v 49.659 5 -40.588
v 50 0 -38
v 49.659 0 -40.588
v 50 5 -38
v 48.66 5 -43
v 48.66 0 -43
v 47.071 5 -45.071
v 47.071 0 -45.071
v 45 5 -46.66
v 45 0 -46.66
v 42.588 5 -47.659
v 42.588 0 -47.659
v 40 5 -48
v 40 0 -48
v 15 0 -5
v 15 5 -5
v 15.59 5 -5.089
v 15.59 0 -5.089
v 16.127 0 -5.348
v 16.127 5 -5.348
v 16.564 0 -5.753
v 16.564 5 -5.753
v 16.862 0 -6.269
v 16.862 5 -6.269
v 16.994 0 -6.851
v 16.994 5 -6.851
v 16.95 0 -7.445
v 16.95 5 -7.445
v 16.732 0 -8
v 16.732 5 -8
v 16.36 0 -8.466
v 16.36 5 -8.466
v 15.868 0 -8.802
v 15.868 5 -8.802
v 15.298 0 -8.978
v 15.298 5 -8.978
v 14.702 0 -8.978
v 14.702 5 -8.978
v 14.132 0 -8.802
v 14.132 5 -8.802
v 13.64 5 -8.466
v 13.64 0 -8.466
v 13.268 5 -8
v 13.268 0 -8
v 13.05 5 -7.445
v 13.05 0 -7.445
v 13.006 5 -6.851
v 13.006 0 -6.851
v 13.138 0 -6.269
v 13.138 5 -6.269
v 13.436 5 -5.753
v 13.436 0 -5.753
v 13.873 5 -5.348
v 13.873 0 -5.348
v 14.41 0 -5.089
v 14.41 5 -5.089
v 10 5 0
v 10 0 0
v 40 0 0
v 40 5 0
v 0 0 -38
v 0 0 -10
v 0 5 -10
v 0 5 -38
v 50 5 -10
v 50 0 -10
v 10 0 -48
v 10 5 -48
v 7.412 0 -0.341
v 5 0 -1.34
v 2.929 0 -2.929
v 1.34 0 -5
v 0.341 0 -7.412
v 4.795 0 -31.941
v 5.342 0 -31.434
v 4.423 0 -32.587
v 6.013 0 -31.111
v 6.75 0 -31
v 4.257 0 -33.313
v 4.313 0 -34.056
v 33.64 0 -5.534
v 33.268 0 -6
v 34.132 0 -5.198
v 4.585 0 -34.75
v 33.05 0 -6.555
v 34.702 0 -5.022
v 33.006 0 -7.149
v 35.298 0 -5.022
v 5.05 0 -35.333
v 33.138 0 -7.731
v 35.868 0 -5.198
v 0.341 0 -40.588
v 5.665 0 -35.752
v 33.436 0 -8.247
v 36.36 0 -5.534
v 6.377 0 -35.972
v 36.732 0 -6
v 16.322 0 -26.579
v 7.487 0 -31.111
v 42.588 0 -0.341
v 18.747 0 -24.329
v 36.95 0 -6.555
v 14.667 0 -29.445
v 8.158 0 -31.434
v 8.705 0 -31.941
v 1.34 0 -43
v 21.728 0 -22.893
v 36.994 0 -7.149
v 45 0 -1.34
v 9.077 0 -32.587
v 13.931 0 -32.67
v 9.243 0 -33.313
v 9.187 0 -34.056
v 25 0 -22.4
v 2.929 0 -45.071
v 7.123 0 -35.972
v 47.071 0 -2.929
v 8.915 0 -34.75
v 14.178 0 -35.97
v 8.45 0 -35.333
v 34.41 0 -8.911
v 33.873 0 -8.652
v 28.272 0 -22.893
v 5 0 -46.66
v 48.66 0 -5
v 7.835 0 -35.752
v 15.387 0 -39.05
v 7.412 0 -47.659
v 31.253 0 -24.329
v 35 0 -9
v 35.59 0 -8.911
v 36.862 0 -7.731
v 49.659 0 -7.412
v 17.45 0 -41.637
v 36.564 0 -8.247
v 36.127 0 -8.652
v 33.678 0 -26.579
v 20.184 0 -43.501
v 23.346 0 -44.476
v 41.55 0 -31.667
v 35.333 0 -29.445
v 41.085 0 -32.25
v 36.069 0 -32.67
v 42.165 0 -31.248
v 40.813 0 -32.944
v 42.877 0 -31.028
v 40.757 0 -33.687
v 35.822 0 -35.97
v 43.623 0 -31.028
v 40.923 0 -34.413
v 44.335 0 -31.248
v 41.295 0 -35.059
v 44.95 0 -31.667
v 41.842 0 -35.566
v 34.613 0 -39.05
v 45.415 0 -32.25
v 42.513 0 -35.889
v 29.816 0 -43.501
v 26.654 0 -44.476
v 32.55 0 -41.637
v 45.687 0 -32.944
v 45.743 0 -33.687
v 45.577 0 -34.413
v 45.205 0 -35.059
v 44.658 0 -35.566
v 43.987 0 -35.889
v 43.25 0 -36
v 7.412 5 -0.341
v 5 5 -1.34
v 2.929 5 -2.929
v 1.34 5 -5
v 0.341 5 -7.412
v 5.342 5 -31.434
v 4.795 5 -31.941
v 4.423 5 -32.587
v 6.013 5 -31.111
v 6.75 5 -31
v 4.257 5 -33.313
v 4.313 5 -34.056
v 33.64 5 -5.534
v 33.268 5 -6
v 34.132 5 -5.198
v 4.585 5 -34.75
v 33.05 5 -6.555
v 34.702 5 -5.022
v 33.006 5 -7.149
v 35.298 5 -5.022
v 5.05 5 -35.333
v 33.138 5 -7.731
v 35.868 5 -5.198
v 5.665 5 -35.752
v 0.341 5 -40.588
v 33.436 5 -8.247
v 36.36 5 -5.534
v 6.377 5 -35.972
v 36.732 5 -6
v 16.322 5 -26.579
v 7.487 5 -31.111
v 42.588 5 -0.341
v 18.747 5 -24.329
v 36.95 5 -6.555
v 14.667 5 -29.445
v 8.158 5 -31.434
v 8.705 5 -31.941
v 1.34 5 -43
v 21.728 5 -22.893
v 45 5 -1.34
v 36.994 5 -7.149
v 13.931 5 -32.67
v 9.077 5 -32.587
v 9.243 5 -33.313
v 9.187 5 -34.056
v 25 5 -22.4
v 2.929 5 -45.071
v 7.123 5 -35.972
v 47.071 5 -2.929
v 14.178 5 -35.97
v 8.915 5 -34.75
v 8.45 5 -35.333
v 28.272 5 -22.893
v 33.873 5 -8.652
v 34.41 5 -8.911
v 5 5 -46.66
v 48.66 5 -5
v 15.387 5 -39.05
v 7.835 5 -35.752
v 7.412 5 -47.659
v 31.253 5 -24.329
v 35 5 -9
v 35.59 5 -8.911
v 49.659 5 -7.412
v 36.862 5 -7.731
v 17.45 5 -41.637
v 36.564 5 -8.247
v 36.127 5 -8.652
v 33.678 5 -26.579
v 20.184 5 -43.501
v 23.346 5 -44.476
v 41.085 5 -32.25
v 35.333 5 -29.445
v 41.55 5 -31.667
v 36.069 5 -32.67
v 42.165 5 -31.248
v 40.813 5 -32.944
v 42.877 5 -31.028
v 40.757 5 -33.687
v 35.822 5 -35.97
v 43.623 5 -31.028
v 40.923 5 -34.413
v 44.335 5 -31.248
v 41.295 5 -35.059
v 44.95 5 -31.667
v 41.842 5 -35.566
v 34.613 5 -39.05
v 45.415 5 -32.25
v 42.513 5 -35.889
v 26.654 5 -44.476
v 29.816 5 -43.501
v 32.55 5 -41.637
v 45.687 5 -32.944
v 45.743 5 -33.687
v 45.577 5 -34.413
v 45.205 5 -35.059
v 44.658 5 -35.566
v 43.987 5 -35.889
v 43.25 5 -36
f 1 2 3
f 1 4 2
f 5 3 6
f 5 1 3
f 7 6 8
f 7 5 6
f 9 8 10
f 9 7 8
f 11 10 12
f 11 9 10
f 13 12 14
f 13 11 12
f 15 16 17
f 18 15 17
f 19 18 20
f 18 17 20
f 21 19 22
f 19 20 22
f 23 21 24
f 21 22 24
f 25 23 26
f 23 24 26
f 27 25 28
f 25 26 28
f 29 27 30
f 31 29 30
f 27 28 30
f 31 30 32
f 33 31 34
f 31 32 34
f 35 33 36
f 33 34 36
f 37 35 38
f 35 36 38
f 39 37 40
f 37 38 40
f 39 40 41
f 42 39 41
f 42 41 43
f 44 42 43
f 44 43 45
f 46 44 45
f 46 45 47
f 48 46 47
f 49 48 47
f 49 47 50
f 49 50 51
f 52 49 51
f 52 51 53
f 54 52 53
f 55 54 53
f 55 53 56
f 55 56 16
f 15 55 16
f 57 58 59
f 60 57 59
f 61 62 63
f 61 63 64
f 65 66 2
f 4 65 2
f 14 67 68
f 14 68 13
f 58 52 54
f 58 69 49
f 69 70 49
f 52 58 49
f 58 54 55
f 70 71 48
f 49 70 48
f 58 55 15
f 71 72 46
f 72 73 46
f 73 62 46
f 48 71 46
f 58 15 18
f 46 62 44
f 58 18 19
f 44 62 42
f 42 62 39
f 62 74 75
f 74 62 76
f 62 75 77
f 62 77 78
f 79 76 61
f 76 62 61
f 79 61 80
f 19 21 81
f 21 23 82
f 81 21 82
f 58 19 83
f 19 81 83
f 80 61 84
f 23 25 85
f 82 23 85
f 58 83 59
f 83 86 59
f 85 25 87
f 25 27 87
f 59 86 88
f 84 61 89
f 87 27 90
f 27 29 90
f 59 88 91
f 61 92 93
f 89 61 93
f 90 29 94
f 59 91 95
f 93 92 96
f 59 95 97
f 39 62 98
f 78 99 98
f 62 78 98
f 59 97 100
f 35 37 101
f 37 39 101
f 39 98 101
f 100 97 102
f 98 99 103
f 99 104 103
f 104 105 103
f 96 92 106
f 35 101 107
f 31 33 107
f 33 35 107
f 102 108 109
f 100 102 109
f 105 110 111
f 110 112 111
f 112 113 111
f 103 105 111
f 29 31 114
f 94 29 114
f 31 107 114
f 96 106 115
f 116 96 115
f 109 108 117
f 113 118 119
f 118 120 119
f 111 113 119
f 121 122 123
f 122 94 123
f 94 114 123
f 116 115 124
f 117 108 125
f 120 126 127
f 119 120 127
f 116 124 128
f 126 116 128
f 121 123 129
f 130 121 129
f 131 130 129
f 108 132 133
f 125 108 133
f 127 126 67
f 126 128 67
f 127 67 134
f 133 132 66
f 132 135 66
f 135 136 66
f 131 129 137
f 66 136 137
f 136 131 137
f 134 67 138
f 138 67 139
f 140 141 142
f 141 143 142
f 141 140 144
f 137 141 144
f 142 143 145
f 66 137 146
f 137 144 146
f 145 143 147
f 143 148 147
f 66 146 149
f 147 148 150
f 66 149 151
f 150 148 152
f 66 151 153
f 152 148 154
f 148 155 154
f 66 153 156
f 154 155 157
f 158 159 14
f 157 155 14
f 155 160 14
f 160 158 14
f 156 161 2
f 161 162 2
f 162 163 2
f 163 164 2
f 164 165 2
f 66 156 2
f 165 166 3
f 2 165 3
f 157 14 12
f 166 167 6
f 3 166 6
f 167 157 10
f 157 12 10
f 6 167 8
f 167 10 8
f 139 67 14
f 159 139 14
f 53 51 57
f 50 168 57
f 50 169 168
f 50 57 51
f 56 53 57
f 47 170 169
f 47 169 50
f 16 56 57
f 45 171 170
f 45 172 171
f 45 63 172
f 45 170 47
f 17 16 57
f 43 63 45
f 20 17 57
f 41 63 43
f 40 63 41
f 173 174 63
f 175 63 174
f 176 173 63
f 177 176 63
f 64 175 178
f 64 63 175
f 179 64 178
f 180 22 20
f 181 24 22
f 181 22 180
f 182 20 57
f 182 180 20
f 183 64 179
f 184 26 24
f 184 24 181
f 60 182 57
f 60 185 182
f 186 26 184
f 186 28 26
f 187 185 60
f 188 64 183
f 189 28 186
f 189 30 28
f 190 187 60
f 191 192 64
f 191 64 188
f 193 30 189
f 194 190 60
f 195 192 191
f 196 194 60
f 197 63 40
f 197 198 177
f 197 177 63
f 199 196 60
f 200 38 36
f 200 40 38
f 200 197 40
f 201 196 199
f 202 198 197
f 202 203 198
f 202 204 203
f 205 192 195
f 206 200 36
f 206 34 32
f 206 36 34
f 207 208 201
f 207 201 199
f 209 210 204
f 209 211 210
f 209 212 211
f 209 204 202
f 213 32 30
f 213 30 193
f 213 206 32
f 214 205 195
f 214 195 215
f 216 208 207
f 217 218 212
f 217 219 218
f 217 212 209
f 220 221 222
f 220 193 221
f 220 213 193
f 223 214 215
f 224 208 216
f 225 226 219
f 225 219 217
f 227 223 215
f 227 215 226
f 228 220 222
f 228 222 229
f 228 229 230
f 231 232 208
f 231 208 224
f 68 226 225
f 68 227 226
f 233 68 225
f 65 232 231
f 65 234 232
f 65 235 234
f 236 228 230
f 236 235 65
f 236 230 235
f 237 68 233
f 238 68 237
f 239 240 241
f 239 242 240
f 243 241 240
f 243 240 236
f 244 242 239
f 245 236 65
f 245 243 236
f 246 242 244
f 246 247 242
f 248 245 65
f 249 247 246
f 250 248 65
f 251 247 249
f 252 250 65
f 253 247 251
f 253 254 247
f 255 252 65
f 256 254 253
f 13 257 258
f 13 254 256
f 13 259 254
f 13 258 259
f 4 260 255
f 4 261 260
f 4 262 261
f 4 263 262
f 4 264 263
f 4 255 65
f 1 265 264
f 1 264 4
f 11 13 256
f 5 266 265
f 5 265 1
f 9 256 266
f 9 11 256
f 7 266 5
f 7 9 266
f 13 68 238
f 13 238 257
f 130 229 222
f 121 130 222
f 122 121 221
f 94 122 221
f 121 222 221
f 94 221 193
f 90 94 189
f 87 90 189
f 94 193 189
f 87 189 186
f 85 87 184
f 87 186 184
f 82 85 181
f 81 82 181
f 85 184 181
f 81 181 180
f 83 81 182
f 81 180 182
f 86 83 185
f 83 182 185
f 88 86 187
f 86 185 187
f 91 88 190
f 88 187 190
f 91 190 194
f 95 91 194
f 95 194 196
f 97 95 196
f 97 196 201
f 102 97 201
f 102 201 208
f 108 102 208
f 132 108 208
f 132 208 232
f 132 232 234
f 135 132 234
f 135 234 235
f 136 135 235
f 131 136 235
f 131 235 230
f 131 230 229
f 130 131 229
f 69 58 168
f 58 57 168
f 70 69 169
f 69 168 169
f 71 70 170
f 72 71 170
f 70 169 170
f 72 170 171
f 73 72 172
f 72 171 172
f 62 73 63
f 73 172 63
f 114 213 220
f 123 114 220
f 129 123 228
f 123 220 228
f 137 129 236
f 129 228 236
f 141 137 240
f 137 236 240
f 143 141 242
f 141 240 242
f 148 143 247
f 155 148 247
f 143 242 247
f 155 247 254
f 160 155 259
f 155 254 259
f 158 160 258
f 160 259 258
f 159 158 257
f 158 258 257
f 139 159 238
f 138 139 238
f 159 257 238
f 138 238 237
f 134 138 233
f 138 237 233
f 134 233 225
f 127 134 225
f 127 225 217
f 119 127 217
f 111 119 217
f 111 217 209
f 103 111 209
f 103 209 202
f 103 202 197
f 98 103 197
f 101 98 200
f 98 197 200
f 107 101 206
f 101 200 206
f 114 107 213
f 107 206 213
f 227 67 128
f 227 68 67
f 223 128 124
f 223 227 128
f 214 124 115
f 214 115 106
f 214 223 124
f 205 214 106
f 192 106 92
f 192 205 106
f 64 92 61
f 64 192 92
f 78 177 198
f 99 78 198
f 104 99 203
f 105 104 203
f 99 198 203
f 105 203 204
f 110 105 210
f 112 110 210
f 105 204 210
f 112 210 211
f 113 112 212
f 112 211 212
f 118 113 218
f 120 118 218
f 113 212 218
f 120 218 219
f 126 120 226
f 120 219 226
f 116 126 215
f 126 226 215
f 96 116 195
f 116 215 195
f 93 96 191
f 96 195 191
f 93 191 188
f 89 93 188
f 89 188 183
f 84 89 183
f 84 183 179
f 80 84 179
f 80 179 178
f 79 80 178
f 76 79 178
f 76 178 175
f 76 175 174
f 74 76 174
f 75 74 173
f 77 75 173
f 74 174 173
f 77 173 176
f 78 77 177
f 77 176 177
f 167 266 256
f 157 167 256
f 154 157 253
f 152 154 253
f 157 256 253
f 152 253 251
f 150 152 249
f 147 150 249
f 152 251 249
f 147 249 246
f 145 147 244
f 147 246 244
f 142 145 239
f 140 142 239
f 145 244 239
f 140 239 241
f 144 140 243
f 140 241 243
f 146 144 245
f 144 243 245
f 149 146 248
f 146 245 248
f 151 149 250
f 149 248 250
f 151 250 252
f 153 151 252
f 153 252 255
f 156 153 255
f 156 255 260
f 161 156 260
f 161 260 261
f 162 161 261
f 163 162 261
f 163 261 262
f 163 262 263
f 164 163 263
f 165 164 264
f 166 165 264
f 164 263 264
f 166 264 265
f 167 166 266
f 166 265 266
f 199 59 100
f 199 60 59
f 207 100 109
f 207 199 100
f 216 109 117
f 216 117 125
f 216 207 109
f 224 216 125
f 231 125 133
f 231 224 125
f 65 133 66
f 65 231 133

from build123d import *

# Parameters (mm, degrees)
ESBO_O1_W                = 50
ESBO_O1_H                = 48
RESSALTO_EXTRUS_O1_DEPTH = 5
ESBO_O2_R                = 11.1
ESBO_O2_R_2              = 2.5
CORTE_EXTRUS_O1_DEPTH    = 5
FILETE1_R                = 10
FILETE2_R                = 10
FILETE3_R                = 10
FILETE4_R                = 10
ESBO_O3_R                = 2
CORTE_EXTRUS_O2_DEPTH    = 22


with BuildPart() as part:
    # Esboço1 → Ressalto-extrusão1 (new body)
    with BuildSketch(Plane(origin=(0, 0, 0), x_dir=(1, 0, 0), z_dir=(0, 1, 0))):
        with Locations((25, 24)):
            Rectangle(ESBO_O1_W, ESBO_O1_H)
    extrude(amount=RESSALTO_EXTRUS_O1_DEPTH)

    # Esboço2 → Corte-extrusão1 (cut)
    with BuildSketch(Plane(origin=(0, 5, 0), x_dir=(1, 0, 0), z_dir=(0, 1, 0))):
        with Locations(Location((25, 33.5, 0), (0, 0, 270))):
            Circle(ESBO_O2_R)
        with Locations(Location((6.75, 33.5, 0), (0, 0, 270))):
            Circle(ESBO_O2_R_2)
        with Locations(Location((43.25, 33.5, 0), (0, 0, 90))):
            Circle(ESBO_O2_R_2)
    extrude(amount=-CORTE_EXTRUS_O1_DEPTH, mode=Mode.SUBTRACT)

    # Filete1
    filete1_edges = [part.edges().sort_by_distance(p)[0] for p in [
        (50, 2.5, 0),
    ]]
    fillet(filete1_edges, radius=FILETE1_R)

    # Filete2
    filete2_edges = [part.edges().sort_by_distance(p)[0] for p in [
        (0, 2.5, 0),
    ]]
    fillet(filete2_edges, radius=FILETE2_R)

    # Filete3
    filete3_edges = [part.edges().sort_by_distance(p)[0] for p in [
        (50, 2.5, -48),
    ]]
    fillet(filete3_edges, radius=FILETE3_R)

    # Filete4
    filete4_edges = [part.edges().sort_by_distance(p)[0] for p in [
        (0, 2.5, -48),
    ]]
    fillet(filete4_edges, radius=FILETE4_R)

    # Esboço3 → Corte-extrusão2 (cut)
    with BuildSketch(Plane(origin=(0, 5, 0), x_dir=(1, 0, 0), z_dir=(0, 1, 0))):
        with Locations(Location((15, 7, 0), (0, 0, 270))):
            Circle(ESBO_O3_R)
        with Locations(Location((35, 7, 0), (0, 0, 90))):
            Circle(ESBO_O3_R)
    extrude(amount=-CORTE_EXTRUS_O2_DEPTH, mode=Mode.SUBTRACT)


solid = part.part
